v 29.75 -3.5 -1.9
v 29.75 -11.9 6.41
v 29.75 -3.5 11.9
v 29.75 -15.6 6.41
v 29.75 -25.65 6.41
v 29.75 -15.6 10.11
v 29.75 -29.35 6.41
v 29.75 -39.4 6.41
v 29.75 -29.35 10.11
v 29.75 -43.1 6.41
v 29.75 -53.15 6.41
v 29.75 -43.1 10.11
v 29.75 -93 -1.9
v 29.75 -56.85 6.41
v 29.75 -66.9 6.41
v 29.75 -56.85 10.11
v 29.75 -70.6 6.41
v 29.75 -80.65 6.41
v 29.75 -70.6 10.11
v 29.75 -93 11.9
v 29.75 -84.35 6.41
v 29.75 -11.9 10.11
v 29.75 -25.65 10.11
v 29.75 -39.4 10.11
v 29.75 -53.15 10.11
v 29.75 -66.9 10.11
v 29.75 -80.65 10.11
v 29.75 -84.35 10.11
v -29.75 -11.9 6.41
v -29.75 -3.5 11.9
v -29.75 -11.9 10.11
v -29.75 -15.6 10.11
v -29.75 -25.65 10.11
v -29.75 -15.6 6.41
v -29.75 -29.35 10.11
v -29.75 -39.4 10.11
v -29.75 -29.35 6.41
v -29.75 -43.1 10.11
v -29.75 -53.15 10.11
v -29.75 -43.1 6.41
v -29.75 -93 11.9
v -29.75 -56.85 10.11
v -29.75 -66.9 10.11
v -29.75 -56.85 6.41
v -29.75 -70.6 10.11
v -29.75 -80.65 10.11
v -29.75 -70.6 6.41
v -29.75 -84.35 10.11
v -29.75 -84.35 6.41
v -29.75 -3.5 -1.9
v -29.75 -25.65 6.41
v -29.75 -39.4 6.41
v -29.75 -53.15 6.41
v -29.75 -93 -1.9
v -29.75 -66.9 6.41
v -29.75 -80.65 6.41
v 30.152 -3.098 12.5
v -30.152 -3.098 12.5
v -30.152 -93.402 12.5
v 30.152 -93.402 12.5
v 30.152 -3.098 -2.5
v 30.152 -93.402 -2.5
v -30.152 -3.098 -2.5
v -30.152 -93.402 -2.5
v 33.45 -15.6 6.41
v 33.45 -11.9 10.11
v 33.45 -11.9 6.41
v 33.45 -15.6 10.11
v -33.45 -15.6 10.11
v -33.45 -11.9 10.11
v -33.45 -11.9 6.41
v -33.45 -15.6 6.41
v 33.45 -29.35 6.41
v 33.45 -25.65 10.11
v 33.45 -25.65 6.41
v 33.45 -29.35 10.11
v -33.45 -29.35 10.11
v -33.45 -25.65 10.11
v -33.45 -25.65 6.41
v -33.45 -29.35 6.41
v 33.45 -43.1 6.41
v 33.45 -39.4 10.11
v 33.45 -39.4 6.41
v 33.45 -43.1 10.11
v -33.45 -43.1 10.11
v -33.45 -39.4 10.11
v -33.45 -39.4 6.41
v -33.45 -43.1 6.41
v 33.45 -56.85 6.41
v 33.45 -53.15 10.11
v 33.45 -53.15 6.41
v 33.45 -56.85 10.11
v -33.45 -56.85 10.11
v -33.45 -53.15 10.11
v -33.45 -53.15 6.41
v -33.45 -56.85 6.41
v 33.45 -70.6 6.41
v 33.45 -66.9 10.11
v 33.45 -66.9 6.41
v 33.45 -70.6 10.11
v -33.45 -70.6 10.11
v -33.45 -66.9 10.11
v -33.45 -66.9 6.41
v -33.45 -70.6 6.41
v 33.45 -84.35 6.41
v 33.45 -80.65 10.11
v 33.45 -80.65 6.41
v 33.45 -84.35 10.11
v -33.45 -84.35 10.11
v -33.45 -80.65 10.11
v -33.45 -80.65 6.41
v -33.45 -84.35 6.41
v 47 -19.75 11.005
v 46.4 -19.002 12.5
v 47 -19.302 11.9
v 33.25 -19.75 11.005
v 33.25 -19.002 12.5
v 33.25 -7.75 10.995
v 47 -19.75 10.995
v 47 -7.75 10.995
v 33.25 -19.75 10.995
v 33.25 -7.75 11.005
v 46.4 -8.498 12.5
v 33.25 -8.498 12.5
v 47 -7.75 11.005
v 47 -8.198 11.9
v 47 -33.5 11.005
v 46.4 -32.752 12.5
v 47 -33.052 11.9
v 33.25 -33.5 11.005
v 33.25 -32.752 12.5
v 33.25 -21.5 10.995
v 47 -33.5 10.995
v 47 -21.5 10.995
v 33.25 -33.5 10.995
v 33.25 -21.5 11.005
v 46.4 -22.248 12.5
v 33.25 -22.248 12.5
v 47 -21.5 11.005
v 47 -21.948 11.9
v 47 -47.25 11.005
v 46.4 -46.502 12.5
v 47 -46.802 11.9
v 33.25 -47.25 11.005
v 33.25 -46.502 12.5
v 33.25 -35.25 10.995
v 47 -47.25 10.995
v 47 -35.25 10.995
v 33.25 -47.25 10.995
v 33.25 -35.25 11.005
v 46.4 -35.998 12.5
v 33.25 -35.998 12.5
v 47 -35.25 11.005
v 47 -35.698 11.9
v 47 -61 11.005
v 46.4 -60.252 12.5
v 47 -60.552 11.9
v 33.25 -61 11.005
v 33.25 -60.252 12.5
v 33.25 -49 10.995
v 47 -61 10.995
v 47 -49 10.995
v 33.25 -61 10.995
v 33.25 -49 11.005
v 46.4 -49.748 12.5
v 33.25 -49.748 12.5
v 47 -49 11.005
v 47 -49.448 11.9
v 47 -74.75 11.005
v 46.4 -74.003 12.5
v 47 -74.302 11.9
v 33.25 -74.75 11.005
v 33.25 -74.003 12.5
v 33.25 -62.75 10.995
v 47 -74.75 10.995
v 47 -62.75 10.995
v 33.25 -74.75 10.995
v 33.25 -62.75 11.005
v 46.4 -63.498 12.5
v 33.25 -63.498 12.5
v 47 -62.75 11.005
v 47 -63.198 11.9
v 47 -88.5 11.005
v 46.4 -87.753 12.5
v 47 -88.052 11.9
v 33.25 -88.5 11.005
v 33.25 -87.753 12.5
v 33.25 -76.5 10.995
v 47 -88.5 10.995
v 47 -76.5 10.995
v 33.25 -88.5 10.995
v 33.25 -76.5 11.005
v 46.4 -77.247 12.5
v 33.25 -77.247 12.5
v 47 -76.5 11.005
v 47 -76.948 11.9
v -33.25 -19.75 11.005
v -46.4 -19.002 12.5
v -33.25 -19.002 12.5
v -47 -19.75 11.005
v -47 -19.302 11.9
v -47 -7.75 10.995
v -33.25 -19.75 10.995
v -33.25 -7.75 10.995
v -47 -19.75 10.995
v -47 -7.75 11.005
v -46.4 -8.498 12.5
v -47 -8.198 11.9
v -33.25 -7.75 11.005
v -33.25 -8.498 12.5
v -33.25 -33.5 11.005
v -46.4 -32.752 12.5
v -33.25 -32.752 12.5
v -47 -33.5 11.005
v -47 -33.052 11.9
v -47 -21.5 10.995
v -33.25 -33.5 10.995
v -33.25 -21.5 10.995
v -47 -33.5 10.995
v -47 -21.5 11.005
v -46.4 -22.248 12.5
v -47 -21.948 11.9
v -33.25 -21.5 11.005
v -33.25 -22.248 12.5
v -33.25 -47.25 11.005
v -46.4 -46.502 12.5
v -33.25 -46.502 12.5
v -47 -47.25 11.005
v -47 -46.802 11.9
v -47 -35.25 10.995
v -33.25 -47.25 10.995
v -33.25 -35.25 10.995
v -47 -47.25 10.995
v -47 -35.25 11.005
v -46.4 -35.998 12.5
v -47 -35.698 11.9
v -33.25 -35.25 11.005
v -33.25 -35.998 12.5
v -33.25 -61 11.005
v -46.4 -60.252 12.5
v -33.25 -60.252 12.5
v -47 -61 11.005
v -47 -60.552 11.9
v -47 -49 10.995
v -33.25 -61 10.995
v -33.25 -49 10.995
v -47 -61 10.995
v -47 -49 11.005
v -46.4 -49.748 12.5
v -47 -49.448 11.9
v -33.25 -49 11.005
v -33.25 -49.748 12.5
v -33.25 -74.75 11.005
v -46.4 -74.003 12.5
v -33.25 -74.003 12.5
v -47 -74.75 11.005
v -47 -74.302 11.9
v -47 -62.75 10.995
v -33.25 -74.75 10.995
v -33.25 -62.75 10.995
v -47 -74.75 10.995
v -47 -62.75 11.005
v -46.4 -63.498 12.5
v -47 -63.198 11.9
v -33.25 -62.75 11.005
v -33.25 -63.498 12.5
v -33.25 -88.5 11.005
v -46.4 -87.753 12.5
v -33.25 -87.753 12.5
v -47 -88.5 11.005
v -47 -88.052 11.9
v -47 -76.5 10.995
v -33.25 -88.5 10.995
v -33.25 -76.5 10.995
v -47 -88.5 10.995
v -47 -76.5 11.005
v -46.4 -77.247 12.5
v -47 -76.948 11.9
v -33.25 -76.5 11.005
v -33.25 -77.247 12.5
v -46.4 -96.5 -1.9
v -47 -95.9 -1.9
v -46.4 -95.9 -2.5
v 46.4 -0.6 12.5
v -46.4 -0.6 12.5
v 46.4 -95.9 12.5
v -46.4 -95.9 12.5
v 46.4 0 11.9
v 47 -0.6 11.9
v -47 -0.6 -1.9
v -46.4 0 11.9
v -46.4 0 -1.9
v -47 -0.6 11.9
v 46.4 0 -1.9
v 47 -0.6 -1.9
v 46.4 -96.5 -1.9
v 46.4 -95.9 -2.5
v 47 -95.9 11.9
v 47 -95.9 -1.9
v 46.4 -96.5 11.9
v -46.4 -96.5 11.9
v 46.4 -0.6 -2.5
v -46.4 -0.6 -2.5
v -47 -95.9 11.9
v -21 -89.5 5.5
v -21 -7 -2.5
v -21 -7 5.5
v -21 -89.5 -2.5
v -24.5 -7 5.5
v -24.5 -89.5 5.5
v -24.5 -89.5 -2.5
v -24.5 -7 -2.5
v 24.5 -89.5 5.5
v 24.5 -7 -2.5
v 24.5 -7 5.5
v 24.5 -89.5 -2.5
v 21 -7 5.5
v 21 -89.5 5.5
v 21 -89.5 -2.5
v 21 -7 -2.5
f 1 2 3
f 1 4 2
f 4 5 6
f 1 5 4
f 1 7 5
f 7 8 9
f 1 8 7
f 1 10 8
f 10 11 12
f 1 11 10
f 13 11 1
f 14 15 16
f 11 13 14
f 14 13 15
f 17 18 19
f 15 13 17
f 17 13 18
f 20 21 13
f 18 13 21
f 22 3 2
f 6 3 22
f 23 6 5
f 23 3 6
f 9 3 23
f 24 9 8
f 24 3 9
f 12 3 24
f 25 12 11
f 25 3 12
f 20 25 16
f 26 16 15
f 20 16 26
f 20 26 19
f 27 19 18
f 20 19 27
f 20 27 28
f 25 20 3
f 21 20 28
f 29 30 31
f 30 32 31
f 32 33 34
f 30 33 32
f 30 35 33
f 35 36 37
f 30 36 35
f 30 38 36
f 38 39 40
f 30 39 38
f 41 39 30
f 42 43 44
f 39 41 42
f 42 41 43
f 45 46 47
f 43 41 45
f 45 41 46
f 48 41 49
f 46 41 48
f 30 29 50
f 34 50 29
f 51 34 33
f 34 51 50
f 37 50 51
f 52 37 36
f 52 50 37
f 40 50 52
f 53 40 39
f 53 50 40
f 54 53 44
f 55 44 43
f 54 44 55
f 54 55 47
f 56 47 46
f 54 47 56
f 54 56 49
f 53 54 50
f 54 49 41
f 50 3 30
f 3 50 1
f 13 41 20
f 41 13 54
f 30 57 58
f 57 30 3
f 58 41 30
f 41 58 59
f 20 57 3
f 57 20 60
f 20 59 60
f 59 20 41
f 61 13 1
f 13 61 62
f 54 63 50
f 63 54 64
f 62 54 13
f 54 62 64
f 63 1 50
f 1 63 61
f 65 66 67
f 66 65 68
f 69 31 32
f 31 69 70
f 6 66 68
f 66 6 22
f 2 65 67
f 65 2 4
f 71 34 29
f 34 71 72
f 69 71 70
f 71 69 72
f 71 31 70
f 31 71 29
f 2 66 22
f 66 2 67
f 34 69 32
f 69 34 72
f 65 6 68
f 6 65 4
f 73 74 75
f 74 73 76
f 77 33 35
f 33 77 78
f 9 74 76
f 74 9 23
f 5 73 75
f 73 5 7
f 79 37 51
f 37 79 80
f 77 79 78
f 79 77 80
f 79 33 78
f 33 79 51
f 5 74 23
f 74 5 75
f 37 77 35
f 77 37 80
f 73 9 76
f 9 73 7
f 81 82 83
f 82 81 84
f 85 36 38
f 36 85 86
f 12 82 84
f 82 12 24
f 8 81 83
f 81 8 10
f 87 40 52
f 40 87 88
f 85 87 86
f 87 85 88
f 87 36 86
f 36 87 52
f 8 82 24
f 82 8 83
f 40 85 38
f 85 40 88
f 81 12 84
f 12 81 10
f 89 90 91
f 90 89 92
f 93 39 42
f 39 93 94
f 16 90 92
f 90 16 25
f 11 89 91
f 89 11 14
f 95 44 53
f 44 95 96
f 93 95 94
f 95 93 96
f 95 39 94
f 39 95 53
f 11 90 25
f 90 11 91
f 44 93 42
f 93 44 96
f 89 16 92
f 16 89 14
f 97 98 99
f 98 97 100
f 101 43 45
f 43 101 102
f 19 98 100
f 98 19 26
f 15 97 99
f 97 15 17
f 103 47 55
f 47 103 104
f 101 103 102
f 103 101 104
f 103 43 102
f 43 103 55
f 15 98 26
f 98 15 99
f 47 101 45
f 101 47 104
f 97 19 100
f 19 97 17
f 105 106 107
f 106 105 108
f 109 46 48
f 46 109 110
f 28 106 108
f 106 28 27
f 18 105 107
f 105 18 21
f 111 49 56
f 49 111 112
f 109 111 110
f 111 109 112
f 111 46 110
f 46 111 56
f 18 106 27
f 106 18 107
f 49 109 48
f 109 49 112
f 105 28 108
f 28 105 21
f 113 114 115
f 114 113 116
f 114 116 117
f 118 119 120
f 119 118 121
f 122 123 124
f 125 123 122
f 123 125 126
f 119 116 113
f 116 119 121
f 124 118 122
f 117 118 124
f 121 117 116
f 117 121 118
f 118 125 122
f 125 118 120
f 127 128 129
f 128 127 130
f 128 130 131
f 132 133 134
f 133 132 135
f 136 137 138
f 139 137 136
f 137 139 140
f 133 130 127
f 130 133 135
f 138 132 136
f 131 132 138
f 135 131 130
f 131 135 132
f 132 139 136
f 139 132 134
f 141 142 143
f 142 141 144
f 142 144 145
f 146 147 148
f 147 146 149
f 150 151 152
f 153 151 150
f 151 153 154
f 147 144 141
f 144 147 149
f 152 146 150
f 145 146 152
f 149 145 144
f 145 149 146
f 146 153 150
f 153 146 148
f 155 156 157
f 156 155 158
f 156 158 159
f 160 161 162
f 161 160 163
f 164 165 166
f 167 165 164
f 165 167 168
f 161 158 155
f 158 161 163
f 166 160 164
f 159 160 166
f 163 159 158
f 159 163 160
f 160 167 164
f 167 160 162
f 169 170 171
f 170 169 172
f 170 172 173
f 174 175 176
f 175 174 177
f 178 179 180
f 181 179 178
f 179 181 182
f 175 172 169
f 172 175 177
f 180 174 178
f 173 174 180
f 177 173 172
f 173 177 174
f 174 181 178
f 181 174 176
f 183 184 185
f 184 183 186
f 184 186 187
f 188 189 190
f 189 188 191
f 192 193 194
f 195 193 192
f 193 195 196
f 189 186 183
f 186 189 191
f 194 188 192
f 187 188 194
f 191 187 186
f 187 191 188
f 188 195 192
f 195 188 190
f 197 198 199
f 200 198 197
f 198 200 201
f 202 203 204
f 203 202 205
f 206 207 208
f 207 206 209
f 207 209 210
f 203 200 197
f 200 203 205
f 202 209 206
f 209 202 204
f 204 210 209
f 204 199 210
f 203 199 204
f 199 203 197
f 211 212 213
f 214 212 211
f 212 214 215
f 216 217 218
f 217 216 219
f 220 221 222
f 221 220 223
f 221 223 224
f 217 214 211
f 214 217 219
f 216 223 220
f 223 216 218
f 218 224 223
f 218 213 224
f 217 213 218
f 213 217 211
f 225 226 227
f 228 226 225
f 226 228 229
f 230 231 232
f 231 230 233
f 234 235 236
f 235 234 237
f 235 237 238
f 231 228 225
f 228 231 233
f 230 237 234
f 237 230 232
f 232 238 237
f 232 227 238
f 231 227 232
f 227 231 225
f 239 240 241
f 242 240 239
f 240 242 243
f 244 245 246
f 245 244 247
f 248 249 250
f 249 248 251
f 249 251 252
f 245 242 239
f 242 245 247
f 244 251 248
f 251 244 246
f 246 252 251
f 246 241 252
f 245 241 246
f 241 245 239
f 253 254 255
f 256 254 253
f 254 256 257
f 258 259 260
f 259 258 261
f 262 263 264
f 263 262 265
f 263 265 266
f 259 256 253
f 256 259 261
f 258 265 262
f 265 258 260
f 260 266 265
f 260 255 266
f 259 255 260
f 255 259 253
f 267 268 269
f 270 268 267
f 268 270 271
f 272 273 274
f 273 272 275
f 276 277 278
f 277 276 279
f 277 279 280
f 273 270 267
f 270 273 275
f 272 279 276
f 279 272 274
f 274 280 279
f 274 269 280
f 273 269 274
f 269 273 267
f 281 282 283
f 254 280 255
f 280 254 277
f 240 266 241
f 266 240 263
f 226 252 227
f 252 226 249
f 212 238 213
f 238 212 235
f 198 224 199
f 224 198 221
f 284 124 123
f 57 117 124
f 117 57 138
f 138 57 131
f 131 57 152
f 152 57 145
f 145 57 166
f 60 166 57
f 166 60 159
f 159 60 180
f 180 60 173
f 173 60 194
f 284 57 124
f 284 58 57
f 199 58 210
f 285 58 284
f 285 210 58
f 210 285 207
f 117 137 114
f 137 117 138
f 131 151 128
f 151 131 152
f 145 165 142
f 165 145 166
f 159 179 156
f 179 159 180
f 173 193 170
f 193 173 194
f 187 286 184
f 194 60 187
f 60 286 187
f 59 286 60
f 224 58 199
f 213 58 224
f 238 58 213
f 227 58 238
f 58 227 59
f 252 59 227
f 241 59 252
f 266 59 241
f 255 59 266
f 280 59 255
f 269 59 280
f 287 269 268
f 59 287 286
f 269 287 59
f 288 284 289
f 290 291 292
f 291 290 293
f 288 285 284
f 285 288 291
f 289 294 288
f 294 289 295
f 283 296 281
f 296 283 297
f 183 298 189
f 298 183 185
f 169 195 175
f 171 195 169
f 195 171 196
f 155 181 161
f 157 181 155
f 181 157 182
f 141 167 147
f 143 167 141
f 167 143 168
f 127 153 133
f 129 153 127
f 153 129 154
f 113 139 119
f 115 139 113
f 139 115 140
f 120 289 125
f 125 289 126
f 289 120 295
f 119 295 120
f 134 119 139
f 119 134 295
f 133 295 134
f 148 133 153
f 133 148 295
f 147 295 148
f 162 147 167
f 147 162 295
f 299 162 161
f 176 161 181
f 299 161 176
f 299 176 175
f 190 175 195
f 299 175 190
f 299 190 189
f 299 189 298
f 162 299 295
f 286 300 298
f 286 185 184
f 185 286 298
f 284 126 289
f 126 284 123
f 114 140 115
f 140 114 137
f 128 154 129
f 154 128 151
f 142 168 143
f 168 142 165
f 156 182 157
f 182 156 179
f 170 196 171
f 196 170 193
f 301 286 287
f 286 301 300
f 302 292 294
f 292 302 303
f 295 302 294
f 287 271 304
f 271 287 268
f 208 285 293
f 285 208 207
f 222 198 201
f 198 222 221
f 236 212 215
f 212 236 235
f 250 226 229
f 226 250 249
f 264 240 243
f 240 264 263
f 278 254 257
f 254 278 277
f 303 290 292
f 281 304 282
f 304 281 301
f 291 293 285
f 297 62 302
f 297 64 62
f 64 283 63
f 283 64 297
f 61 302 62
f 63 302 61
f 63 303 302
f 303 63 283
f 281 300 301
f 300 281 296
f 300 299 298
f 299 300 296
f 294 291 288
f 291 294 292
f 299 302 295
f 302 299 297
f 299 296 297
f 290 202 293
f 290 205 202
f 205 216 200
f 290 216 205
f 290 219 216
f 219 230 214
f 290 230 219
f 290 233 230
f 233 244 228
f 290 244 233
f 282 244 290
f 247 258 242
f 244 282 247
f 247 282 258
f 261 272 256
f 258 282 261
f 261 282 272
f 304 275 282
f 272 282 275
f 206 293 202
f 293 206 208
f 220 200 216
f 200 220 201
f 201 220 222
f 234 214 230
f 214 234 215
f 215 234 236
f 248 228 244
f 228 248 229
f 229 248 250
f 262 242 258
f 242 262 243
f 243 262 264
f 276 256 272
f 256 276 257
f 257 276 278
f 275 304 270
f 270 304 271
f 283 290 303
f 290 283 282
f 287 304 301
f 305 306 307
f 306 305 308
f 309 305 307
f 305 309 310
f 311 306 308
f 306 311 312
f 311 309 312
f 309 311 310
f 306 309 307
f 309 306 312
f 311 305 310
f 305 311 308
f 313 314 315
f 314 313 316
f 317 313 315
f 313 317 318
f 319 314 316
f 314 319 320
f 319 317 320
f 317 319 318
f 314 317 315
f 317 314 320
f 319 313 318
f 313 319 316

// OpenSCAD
//frame
thick=3.5;
bead=12;
rod=66.5;
ep=0.01;
$fa=1;
$fs=1;
bevel=.6;
rc=6; //rods
module frame()
{
    difference()
    {
        //main body
        //translate([0,-bead/2-thick/2,5])cube([rod+thick+2*bead,4*bead+thick*3+thick*3,15],center=true);
        translate([0,-(rc*(bead+thick/2)+thick*4)/2,5])hull()
        {
            cube([rod+thick+2*bead-bevel*2,rc*(bead+thick/2)+thick*4,15-bevel*2],center=true);
            cube([rod+thick+2*bead,rc*(bead+thick/2)+thick*4-bevel*2,15-bevel*2],center=true);
            cube([rod+thick+2*bead-bevel*2,rc*(bead+thick/2)+thick*4-bevel*2,15],center=true);
        }
        //inner space
        //translate([0,-bead/2-thick/2,5])cube([rod-thick,4*bead+thick*3+thick,20],center=true);
        translate([0,-(rc*(bead+thick/2)+thick*4)/2,5])
        {
            cube([rod-thick*2,rc*(bead+thick/2)+thick*2,15+ep],center=true);
            translate([0,0,15/2-bevel/2])hull()
            {
                cube([rod-thick*2,rc*(bead+thick/2)+thick*2,bevel],center=true);
                translate([0,0,bevel])cube([rod-thick*2+bevel*2,rc*(bead+thick/2)+thick*2+bevel*2,ep],center=true);
            }
            translate([0,0,-15/2+bevel/2])hull()
            {
                cube([rod-thick*2,rc*(bead+thick/2)+thick*2,bevel],center=true);
                translate([0,0,-bevel])cube([rod-thick*2+bevel*2,rc*(bead+thick/2)+thick*2+bevel*2,ep],center=true);
            }
        }
        //rods
        for (rody=[1:rc])
        {
            translate([0,-rody*(bead+thick/2),ep])rod_slot();
        }
        //translate([0,(bead+thick/2),ep])rod_slot();
        //translate([0,-(bead+thick/2),ep])rod_slot();
        //translate([0,-2*(bead+thick/2),ep])rod_slot();
        //identifiers
        
        //insert slots
        for (rody=[1:rc])
        {
            translate([rod/2+bead,-rody*(bead+thick/2),9.5+1.5])insert_slot();
        }
        for (rody=[1:rc])
        {
            translate([-(rod/2+bead),-rody*(bead+thick/2),9.5+1.5])insert_slot();
        }
        //translate([rod/2+bead,0,9.5+1.5])insert_slot();
        //translate([rod/2+bead,(bead+thick/2),9.5+1.5])insert_slot();
        //translate([rod/2+bead,-1*(bead+thick/2),9.5+1.5])insert_slot();
        //translate([rod/2+bead,-2*(bead+thick/2),9.5+1.5])insert_slot();
    }
}
//bead keeper
module keeper()
{
    translate([-(rod/2-thick-7),-(rc*(bead+thick/2)+thick*4)/2,(8/2)-2.5])cube([thick,rc*(bead+thick/2),8],center=true);
    translate([(rod/2-thick-7),-(rc*(bead+thick/2)+thick*4)/2,(8/2)-2.5])cube([thick,rc*(bead+thick/2),8],center=true);
}
//insert();
module insert()
{
    inset=.2;
    hull()
    {
        cube([bead,bead-inset,ep],center=true);
        translate([0,0,1.5-.2])cube([bead,bead-1.5-inset,ep],center=true);
    }
}
module rod_slot()
{
    translate([0,0,10-thick/2])cube([rod+.4,thick+.2,thick+.2],center=true);
}
module insert_slot()
{
    hull()
    {
        cube([bead*2,bead,ep],center=true);
        translate([0,0,1.5])cube([bead*2,bead-1.5,ep],center=true);
    }
}
module rod()
{
    difference()
    {
        rotate([0,90,0])cylinder(r=(thick+.4)/2,h=rod,center=true,$fn=24);
        translate([0,0,(thick-.1)])cube([rod*2,thick*4,thick],center=true);
        translate([0,0,-(thick-.1)])cube([rod*2,thick*4,thick],center=true);
    }
}
module bead()
{
    translate([0,0,0])difference()
    {
        hull()
        {
            translate([0,0,0])cylinder(r=bead/2-.5,h=thick,center=true);
            translate([0,0,0])cylinder(r=bead/2,h=ep,center=true);
        }
        cylinder(r=(thick+1)/2,h=thick*4,center=true,$fn=24);
        translate([0,0,-thick/2-ep])cylinder(r1=(thick+1)/2+bevel,r2=(thick+1)/2,h=bevel,center=false,$fn=24);
        translate([0,0,+thick/2+ep-bevel])cylinder(r2=(thick+1)/2+bevel,r1=(thick+1)/2,h=bevel,center=false,$fn=24);
        
    }
}
module split_bead()
{
    nub_r=((bead/2)-((thick+1)/2))/2;
    inside_r=(thick+1)/2;
    grab_l=.75;
    difference()
    {
        bead();
        difference()
        {
            translate([0,-bead/2,0])cube([(thick+1),bead,thick*2],center=true);
            translate([inside_r+nub_r-grab_l,-nub_r-inside_r,0])sphere(r=nub_r,$fn=24);
            translate([-1*(inside_r+nub_r-grab_l),-nub_r-inside_r,0])sphere(r=nub_r,$fn=24);
        }
    }
}

//split_bead();
//bead();
//rod();
frame();
keeper();
//split frame
module split_frame()
{
    difference()
    {
        translate([0,0,5])cube([rod+thick,bead+thick*2+thick*3,15],center=true);
        translate([0,0,5])cube([rod-thick,bead+thick*2+thick,20],center=true);
        translate([0,0,ep])rod_slot();
    }
    //inner
    difference()
    {
        translate([thick/2,0,5])cube([thick,bead+thick*5,15],center=true);
        translate([0,0,ep])rod_slot();
    }
}

//split_frame();
